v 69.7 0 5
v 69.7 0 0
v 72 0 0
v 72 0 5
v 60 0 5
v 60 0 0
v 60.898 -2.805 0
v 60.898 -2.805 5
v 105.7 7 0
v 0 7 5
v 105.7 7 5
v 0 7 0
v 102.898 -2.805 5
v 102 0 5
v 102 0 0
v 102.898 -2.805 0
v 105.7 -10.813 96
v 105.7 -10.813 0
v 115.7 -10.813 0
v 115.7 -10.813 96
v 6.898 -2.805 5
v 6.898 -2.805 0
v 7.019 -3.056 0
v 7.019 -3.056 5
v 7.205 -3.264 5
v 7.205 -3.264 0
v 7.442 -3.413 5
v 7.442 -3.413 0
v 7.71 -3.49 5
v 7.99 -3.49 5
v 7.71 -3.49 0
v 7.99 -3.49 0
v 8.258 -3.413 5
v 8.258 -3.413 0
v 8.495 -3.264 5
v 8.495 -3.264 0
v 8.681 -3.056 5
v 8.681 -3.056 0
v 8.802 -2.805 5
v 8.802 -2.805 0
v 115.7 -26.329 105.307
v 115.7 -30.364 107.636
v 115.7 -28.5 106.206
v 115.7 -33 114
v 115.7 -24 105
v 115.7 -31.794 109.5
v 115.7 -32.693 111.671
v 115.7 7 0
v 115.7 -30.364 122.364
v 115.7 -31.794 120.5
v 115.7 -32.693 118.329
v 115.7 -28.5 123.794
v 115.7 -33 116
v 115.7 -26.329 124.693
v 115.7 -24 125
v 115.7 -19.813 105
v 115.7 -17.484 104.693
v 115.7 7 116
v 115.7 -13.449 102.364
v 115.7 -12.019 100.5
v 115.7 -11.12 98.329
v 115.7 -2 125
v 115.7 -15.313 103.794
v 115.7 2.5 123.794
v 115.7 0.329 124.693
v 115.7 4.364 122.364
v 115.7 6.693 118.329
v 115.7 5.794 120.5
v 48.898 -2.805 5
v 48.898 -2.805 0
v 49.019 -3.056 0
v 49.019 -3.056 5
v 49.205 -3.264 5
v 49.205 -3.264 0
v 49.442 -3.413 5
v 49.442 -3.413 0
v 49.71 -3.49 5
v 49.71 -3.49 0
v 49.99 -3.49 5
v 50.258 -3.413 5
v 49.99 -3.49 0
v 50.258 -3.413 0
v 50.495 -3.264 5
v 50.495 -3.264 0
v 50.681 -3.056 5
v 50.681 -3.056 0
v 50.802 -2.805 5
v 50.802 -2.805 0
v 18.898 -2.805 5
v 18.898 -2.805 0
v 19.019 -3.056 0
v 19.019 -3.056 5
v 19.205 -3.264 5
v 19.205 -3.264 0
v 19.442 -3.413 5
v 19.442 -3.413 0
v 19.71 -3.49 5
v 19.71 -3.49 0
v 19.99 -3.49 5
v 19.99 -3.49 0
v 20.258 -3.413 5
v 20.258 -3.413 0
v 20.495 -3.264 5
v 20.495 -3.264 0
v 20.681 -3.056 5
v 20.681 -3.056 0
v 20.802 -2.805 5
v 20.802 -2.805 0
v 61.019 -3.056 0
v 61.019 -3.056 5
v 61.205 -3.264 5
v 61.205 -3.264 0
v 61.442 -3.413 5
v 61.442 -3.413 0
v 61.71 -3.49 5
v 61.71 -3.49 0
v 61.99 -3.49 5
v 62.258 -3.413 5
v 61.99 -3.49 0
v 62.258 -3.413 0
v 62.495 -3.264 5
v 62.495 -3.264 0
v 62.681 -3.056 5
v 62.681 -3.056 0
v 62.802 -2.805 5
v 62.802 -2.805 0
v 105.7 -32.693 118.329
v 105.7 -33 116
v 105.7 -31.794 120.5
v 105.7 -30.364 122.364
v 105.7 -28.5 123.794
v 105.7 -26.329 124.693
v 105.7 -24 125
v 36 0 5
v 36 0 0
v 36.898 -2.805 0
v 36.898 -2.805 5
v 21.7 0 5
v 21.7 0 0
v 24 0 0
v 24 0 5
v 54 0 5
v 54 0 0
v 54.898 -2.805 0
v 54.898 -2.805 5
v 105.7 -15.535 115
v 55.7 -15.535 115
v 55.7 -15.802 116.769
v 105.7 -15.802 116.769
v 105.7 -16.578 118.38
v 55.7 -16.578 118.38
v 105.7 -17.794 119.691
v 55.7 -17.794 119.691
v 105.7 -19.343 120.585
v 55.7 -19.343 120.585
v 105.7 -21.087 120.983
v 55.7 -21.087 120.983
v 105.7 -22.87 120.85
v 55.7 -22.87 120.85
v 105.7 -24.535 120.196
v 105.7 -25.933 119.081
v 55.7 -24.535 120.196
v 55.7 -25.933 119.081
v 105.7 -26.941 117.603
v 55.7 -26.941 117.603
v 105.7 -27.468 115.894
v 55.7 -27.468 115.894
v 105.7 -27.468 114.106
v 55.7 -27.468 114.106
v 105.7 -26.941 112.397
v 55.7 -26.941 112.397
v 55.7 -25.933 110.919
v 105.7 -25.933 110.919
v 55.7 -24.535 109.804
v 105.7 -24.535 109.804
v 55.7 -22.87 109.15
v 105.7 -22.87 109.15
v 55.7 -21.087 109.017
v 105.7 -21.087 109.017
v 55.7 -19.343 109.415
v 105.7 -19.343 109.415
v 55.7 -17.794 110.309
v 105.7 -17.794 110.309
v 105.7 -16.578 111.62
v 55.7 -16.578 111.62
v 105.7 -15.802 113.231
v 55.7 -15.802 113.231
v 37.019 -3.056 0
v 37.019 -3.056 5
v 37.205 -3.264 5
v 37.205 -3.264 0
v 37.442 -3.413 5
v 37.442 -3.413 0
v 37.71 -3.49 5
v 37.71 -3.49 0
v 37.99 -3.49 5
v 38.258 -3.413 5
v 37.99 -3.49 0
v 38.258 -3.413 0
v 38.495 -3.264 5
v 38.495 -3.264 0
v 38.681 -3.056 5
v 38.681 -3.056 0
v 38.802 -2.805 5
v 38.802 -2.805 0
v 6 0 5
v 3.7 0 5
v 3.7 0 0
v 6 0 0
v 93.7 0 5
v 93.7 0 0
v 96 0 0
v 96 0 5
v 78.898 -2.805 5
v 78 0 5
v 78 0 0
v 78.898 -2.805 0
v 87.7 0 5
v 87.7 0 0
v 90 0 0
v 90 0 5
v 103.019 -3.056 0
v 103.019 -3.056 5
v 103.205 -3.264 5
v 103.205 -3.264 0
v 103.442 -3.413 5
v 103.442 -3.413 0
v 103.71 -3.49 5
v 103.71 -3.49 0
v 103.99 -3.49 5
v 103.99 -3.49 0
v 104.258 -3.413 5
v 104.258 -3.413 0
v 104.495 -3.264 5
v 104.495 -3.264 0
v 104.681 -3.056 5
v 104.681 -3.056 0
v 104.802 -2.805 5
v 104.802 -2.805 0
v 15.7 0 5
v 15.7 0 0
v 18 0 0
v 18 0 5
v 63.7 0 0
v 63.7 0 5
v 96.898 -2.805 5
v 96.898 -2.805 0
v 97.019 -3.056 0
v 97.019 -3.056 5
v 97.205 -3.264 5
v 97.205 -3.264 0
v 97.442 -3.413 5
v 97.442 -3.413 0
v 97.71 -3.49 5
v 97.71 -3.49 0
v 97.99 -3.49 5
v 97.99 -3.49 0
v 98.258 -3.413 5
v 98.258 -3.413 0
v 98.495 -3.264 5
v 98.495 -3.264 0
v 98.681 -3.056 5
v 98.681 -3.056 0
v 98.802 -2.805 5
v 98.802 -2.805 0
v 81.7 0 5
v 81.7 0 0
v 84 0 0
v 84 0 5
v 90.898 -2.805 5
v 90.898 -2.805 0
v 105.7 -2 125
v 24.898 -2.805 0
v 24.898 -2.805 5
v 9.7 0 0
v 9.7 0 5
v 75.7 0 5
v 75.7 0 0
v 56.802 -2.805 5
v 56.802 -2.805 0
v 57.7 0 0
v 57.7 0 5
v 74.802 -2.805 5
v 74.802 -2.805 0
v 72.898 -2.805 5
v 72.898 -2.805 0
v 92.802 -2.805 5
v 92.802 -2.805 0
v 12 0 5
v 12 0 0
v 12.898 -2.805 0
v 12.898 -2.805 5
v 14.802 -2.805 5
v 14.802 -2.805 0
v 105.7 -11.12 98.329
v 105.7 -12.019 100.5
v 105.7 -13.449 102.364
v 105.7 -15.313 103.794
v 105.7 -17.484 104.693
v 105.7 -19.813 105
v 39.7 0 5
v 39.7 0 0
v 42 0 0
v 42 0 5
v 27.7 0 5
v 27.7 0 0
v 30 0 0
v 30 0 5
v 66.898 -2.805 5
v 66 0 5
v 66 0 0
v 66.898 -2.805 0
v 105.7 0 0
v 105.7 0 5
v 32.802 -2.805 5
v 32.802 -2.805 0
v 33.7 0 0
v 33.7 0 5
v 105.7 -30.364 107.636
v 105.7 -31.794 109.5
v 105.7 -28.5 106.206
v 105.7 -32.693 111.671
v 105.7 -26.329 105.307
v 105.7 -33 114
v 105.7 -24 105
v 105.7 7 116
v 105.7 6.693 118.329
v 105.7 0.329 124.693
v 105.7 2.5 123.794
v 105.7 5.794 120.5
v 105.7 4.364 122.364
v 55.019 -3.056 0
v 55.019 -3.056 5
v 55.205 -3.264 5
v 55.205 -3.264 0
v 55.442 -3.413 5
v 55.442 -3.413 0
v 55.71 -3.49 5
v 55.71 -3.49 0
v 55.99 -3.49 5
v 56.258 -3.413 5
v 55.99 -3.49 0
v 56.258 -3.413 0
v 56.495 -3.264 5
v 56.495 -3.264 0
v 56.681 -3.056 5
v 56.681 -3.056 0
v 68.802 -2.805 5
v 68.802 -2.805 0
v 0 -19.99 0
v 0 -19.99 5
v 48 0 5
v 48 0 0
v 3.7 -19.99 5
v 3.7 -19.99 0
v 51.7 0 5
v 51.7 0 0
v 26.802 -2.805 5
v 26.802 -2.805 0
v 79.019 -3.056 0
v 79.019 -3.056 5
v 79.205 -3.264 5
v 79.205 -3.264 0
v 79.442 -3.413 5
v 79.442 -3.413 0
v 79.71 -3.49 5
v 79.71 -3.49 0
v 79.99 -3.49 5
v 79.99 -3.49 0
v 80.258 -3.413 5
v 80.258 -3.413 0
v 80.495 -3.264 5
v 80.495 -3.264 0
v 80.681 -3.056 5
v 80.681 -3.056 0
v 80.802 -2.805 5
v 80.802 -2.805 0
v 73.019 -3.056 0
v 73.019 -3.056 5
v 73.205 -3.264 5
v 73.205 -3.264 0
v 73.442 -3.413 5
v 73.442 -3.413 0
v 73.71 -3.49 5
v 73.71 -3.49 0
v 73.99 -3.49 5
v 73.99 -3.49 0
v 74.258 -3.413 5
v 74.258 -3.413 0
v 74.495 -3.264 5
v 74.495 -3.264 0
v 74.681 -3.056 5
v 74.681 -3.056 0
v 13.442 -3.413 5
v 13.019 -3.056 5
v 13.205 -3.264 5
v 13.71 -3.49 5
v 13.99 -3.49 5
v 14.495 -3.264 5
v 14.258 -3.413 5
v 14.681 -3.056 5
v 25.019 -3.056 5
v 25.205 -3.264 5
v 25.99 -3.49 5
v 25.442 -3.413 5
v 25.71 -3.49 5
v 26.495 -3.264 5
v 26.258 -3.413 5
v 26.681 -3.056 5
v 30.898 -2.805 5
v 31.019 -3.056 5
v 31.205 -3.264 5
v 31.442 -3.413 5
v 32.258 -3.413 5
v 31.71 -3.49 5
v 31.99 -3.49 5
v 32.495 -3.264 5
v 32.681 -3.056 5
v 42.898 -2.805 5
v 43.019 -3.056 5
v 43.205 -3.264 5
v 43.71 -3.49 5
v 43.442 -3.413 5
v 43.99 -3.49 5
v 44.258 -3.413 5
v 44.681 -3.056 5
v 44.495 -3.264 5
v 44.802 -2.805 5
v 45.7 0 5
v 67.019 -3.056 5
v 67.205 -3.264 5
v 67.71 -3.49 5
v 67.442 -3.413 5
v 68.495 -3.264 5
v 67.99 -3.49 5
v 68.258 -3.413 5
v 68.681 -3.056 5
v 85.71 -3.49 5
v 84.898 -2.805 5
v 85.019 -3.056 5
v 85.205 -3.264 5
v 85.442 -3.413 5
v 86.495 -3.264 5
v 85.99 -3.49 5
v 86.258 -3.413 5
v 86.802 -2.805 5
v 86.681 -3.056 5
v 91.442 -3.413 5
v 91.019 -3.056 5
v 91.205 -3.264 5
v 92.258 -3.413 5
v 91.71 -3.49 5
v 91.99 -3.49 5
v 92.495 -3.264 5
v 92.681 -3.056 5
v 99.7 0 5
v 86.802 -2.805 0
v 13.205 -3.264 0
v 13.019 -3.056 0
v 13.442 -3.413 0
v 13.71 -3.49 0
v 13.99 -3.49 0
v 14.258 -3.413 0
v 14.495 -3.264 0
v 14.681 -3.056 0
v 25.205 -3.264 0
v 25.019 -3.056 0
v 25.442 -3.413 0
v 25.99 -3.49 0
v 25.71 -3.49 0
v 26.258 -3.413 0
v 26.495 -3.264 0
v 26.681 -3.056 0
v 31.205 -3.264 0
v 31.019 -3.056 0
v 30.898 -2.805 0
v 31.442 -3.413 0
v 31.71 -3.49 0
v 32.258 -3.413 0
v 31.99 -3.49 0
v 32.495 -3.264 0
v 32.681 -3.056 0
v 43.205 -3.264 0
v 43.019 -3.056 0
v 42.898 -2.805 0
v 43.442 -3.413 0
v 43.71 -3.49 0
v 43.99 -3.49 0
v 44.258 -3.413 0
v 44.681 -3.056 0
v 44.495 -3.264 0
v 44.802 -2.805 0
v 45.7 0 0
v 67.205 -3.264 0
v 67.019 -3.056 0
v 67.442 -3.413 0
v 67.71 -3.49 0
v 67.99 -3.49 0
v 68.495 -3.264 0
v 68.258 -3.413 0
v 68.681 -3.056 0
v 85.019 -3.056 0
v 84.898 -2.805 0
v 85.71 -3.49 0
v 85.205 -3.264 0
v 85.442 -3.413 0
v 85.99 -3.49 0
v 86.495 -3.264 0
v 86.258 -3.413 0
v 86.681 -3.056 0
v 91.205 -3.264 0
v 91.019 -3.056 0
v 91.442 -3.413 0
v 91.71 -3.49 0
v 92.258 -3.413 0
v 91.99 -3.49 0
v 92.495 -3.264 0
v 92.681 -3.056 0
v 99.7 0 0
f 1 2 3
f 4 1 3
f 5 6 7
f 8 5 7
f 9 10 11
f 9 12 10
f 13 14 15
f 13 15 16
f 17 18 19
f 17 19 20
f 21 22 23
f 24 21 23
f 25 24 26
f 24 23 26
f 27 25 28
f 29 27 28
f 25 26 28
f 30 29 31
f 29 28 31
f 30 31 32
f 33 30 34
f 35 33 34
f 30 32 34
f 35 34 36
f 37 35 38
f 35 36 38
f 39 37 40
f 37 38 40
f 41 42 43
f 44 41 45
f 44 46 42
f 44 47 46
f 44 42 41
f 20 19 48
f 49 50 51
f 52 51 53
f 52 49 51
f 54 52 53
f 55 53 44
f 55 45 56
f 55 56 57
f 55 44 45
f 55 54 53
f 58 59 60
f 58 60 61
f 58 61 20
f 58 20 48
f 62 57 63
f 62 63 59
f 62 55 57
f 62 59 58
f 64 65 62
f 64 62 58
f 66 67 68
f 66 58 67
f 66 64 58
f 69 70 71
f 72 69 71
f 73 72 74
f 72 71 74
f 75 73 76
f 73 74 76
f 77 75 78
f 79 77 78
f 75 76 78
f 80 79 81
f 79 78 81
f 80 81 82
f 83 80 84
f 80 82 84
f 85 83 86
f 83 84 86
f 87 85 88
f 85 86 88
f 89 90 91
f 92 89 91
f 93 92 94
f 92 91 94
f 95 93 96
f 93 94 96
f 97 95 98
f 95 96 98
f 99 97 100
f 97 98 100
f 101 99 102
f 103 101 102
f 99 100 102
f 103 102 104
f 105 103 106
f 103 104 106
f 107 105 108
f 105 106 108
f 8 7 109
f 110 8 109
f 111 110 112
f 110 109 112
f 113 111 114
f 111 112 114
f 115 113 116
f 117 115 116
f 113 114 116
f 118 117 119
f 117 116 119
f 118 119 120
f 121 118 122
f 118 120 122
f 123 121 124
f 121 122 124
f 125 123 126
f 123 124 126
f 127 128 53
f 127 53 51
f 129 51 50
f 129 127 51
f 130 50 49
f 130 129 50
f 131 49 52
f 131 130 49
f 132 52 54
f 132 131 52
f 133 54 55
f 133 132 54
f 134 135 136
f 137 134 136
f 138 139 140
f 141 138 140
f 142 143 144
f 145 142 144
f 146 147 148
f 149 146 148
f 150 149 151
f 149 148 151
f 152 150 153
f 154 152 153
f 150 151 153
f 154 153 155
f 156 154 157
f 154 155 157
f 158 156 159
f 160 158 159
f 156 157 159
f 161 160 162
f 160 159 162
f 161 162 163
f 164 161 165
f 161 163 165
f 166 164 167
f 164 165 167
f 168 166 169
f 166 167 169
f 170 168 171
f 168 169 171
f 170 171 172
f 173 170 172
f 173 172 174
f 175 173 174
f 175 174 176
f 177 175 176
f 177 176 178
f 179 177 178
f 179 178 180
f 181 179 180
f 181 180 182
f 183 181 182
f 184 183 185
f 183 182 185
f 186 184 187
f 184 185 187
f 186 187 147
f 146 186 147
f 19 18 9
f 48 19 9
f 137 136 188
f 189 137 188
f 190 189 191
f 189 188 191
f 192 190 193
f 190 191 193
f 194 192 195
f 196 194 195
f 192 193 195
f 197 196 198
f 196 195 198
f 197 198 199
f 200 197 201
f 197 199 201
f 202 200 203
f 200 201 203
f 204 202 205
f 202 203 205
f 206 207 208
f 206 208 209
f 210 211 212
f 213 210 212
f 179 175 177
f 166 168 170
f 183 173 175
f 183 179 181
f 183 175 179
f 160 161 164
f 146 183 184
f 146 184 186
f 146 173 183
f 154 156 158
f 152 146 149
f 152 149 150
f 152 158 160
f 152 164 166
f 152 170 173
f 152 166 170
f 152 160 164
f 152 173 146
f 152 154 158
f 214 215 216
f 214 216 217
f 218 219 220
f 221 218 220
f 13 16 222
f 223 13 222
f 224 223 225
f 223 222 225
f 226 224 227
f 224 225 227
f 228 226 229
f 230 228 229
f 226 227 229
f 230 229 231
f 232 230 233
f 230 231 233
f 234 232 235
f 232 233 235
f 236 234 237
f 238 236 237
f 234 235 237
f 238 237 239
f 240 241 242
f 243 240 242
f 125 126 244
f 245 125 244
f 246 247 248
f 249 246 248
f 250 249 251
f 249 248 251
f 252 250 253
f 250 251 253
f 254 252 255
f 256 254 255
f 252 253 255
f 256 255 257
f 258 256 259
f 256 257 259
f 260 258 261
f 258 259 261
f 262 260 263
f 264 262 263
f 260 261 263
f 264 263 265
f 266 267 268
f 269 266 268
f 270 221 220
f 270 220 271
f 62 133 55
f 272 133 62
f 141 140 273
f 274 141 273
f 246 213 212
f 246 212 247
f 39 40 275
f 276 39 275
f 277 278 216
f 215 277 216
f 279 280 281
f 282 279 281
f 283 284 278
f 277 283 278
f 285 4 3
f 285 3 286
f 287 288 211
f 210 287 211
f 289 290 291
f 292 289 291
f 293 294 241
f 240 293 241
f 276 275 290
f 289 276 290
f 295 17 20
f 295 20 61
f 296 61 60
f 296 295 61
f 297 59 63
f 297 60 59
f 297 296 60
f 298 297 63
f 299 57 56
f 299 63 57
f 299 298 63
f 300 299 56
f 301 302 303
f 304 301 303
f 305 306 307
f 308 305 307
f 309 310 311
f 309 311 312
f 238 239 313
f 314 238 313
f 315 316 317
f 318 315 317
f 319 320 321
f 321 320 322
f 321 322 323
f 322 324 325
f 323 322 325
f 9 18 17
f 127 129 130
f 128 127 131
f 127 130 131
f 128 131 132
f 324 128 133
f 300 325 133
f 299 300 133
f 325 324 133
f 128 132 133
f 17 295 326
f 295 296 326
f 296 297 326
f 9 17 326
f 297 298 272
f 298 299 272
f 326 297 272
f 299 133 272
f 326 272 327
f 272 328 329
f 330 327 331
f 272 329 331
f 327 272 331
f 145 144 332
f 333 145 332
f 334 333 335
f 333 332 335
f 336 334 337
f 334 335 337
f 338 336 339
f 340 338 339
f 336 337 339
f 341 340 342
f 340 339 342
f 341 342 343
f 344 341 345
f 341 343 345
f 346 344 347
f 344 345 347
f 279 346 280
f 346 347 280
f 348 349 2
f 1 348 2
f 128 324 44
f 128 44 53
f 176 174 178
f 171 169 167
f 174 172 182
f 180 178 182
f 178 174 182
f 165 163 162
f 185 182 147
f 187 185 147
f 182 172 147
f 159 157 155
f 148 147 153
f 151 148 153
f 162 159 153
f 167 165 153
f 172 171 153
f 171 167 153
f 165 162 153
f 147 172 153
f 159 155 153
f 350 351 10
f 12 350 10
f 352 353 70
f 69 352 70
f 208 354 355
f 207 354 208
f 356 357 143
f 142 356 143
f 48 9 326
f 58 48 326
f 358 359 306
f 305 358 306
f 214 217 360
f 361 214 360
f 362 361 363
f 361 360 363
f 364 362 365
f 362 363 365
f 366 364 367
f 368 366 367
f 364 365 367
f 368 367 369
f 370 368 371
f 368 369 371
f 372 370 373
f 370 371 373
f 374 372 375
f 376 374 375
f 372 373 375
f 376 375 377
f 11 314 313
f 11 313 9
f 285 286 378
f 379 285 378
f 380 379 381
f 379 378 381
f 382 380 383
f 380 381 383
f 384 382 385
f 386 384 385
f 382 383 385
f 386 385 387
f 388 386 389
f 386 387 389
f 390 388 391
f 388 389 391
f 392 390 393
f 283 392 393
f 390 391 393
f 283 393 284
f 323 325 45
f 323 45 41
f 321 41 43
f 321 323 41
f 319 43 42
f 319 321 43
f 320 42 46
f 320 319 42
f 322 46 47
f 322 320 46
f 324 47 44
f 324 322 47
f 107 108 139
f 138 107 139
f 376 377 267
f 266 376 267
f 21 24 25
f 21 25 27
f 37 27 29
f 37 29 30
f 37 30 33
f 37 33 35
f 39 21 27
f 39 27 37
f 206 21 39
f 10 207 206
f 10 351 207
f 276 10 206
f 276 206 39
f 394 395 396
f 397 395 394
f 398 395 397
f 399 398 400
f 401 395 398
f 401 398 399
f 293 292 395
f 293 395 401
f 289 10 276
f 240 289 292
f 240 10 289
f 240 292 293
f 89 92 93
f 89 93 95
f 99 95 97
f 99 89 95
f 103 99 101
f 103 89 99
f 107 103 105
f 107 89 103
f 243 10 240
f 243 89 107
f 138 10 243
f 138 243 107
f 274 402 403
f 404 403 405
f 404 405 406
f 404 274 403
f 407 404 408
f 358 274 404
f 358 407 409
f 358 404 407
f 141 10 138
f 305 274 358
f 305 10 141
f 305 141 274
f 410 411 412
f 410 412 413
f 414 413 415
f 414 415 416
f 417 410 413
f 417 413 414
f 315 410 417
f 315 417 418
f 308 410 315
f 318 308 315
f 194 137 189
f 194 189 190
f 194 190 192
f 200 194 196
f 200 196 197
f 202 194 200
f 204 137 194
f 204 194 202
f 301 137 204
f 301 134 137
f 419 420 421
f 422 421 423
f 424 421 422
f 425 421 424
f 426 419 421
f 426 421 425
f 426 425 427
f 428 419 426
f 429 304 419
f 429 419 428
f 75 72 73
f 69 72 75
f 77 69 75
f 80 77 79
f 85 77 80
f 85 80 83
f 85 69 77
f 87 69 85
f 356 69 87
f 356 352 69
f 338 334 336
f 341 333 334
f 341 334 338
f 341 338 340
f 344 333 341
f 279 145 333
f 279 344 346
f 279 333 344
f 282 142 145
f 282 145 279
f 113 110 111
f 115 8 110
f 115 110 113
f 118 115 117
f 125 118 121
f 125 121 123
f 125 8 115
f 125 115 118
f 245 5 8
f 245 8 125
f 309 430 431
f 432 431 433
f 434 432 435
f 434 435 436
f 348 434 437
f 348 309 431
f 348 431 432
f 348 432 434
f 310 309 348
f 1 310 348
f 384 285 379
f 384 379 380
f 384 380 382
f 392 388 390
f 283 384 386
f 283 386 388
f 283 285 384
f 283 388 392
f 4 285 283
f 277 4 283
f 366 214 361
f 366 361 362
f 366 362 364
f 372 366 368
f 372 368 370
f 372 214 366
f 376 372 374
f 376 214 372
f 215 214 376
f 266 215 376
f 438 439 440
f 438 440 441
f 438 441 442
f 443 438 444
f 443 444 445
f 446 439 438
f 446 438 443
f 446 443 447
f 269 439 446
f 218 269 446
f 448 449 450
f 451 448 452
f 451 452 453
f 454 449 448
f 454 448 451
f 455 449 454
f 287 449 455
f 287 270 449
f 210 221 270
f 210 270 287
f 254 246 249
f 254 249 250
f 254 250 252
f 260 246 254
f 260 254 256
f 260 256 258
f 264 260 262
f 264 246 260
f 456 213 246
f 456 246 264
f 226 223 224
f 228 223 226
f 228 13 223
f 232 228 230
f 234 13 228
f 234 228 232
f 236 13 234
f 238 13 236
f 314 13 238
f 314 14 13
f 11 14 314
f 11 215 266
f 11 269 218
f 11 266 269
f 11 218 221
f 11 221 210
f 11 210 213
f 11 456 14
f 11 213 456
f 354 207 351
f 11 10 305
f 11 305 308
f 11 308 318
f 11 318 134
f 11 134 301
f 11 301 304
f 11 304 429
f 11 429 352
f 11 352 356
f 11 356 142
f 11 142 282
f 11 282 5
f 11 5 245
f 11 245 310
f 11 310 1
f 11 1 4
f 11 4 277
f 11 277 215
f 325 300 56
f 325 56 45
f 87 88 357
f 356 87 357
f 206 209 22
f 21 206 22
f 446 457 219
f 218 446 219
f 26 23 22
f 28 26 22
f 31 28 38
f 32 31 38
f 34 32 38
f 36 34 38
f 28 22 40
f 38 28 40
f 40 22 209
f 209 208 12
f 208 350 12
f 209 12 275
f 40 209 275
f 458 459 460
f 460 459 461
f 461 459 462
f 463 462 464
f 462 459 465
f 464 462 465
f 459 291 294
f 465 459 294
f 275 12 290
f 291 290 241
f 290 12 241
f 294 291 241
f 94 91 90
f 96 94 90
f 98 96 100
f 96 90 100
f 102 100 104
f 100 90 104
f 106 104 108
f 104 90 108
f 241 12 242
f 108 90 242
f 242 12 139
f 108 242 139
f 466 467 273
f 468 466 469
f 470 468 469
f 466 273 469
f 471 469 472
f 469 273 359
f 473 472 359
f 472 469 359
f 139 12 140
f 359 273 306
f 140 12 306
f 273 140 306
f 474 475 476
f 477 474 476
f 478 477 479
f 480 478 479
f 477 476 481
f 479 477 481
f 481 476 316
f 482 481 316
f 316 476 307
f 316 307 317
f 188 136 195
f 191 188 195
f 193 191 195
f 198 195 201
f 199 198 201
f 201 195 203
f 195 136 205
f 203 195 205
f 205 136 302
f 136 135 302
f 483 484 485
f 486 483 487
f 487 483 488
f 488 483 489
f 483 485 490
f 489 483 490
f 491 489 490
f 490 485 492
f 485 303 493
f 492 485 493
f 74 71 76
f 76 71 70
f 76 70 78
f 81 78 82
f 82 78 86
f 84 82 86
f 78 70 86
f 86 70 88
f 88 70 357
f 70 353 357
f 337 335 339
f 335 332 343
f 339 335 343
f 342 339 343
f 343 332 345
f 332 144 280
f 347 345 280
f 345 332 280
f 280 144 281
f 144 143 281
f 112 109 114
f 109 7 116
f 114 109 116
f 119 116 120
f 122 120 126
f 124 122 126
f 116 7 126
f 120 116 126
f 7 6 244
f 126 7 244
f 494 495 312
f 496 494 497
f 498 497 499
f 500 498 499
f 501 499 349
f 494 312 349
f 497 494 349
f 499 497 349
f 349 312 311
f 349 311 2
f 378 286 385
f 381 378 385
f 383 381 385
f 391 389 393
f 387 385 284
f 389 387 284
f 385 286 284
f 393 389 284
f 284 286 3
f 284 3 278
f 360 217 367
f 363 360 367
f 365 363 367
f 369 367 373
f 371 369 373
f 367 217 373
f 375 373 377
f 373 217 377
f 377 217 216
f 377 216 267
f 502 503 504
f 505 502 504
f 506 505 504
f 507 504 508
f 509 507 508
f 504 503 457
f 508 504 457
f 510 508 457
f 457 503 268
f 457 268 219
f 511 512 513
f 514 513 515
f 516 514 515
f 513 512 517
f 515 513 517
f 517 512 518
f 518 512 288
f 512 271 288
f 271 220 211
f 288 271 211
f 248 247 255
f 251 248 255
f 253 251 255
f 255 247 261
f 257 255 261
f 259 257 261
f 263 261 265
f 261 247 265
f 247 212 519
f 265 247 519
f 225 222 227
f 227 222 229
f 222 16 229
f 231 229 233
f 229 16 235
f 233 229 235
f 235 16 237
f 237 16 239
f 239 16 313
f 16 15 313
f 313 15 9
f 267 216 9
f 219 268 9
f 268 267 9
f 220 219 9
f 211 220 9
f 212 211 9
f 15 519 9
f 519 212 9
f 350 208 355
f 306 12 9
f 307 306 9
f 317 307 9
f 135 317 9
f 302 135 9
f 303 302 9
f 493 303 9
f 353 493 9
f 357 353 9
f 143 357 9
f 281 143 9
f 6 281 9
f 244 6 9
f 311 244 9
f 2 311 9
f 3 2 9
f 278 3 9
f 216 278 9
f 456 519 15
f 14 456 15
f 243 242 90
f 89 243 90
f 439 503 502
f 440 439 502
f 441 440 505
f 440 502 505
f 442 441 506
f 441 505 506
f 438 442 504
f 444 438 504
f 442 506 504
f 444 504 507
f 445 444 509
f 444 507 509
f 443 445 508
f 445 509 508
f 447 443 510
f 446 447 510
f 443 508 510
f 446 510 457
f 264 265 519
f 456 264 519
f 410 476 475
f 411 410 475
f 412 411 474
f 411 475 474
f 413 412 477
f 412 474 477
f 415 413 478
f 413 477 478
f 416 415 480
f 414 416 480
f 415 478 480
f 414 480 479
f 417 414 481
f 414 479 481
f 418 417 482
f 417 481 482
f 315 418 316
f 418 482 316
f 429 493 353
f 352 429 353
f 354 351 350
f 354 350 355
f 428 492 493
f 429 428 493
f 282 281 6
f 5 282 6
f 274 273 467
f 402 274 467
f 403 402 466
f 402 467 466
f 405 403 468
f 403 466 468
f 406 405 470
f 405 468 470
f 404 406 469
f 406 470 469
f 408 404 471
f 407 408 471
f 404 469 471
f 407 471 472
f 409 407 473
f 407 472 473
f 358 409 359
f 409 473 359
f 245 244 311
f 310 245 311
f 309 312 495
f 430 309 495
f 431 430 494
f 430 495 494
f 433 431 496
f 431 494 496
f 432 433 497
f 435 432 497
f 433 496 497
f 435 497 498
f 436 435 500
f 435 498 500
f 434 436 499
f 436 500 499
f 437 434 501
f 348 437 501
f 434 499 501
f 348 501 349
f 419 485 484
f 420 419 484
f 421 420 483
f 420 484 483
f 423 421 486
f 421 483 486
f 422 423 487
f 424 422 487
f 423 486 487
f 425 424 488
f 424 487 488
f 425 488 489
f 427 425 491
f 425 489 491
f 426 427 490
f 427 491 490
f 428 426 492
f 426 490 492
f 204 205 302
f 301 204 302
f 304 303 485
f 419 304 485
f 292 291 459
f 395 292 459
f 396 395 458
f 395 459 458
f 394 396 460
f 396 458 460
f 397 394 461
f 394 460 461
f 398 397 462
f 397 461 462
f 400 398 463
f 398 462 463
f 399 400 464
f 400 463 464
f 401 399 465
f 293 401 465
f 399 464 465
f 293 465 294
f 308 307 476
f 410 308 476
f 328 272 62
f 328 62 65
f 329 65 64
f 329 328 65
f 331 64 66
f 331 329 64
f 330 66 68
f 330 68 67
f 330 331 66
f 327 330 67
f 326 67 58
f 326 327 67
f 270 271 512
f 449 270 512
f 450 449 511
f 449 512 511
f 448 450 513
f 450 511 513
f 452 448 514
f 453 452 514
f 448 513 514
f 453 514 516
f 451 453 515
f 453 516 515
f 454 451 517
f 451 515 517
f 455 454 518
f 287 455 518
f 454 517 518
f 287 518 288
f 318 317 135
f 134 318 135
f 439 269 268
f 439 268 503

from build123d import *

# Parameters (mm, degrees)
DODANIE_WYCI_GNI_CIE1_DEPTH = 5
SZKIC3_W                    = 10
SZKIC3_H                    = 40
DODANIE_WYCI_GNI_CIE2_DEPTH = 120
SZKIC4_R                    = 6
DODANIE_WYCI_GNI_CIE3_DEPTH = 50
PODZIEL1_START              = 105.7
PODZIEL1_OUTLINE_W          = 40
PODZIEL1_OUTLINE_H          = 125
PODZIEL1_DEPTH              = 10
PODZIEL1_START_2            = 55.7
PODZIEL1_2_OUTLINE_R        = 6
PODZIEL1_2_DEPTH            = 50
PODZIEL1_3_OUTLINE_W        = 40
PODZIEL1_3_OUTLINE_H        = 125
PODZIEL1_3_DEPTH            = 10
PODZIEL1_4_OUTLINE_R        = 6
PODZIEL1_4_DEPTH            = 50
WYTNIJ_WYCI_GNI_CIE1_DEPTH  = 167.992484861
SZKIC7_W                    = 3.7
SZKIC7_H                    = 26.99
DODANIE_WYCI_GNI_CIE4_DEPTH = 5


# Read off the part's stored shape, not the designer's step: Podziel1
with BuildPart() as part:
    # Szkic2 → Dodanie-wyciągnięcie1 (new body)
    with BuildSketch(Plane.XY):
        with BuildLine():
            Line((9.7, 0), (12, 0))
            Line((12, 0), (12.897580547, -2.804790395))
            ThreePointArc((12.897580547, -2.804790395), (13.85, -3.5), (14.802419453, -2.804790395))
            Line((14.802419453, -2.804790395), (15.7, 0))
            Line((15.7, 0), (18, 0))
            Line((18, 0), (18.897580547, -2.804790395))
            ThreePointArc((18.897580547, -2.804790395), (19.85, -3.5), (20.802419453, -2.804790395))
            Line((20.802419453, -2.804790395), (21.7, 0))
            Line((21.7, 0), (24, 0))
            Line((24, 0), (24.897580547, -2.804790395))
            ThreePointArc((24.897580547, -2.804790395), (25.85, -3.5), (26.802419453, -2.804790395))
            Line((26.802419453, -2.804790395), (27.7, 0))
            Line((27.7, 0), (30, 0))
            Line((30, 0), (30.897580547, -2.804790395))
            ThreePointArc((30.897580547, -2.804790395), (31.85, -3.5), (32.802419453, -2.804790395))
            Line((32.802419453, -2.804790395), (33.7, 0))
            Line((33.7, 0), (36, 0))
            Line((36, 0), (36.897580547, -2.804790395))
            ThreePointArc((36.897580547, -2.804790395), (37.85, -3.5), (38.802419453, -2.804790395))
            Line((38.802419453, -2.804790395), (39.7, 0))
            Line((39.7, 0), (42, 0))
            Line((42, 0), (42.897580547, -2.804790395))
            ThreePointArc((42.897580547, -2.804790395), (43.85, -3.5), (44.802419453, -2.804790395))
            Line((44.802419453, -2.804790395), (45.7, 0))
            Line((45.7, 0), (48, 0))
            Line((48, 0), (48.897580547, -2.804790395))
            ThreePointArc((48.897580547, -2.804790395), (49.85, -3.5), (50.802419453, -2.804790395))
            Line((50.802419453, -2.804790395), (51.7, 0))
            Line((51.7, 0), (54, 0))
            Line((54, 0), (54.897580547, -2.804790395))
            ThreePointArc((54.897580547, -2.804790395), (55.85, -3.5), (56.802419453, -2.804790395))
            Line((56.802419453, -2.804790395), (57.7, 0))
            Line((57.7, 0), (60, 0))
            Line((60, 0), (60.897580547, -2.804790395))
            ThreePointArc((60.897580547, -2.804790395), (61.85, -3.5), (62.802419453, -2.804790395))
            Line((62.802419453, -2.804790395), (63.7, 0))
            Line((63.7, 0), (66, 0))
            Line((66, 0), (66.897580547, -2.804790395))
            ThreePointArc((66.897580547, -2.804790395), (67.85, -3.5), (68.802419453, -2.804790395))
            Line((68.802419453, -2.804790395), (69.7, 0))
            Line((69.7, 0), (72, 0))
            Line((72, 0), (72.897580547, -2.804790395))
            ThreePointArc((72.897580547, -2.804790395), (73.85, -3.5), (74.802419453, -2.804790395))
            Line((74.802419453, -2.804790395), (75.7, 0))
            Line((75.7, 0), (78, 0))
            Line((78, 0), (78.897580547, -2.804790395))
            ThreePointArc((78.897580547, -2.804790395), (79.85, -3.5), (80.802419453, -2.804790395))
            Line((80.802419453, -2.804790395), (81.7, 0))
            Line((81.7, 0), (84, 0))
            Line((84, 0), (84.897580547, -2.804790395))
            ThreePointArc((84.897580547, -2.804790395), (85.85, -3.5), (86.802419453, -2.804790395))
            Line((86.802419453, -2.804790395), (87.7, 0))
            Line((87.7, 0), (90, 0))
            Line((90, 0), (90.897580547, -2.804790395))
            ThreePointArc((90.897580547, -2.804790395), (91.85, -3.5), (92.802419453, -2.804790395))
            Line((92.802419453, -2.804790395), (93.7, 0))
            Line((93.7, 0), (96, 0))
            Line((96, 0), (96.897580547, -2.804790395))
            ThreePointArc((96.897580547, -2.804790395), (97.85, -3.5), (98.802419453, -2.804790395))
            Line((98.802419453, -2.804790395), (99.7, 0))
            Line((99.7, 0), (102, 0))
            Line((102, 0), (102.897580547, -2.804790395))
            ThreePointArc((102.897580547, -2.804790395), (103.85, -3.5), (104.802419453, -2.804790395))
            Line((104.802419453, -2.804790395), (105.7, 0))
            Line((105.7, 0), (105.7, -33))
            Line((105.7, -33), (115.7, -33))
            Line((115.7, -33), (115.7, 7))
            Line((115.7, 7), (105.7, 7))
            Line((105.7, 7), (0, 7))
            Line((0, 7), (0, 0))
            Line((0, 0), (0.897580547, -2.804790395))
            ThreePointArc((0.897580547, -2.804790395), (1.85, -3.5), (2.802419453, -2.804790395))
            Line((2.802419453, -2.804790395), (3.7, 0))
            Line((3.7, 0), (6, 0))
            Line((6, 0), (6.897580547, -2.804790395))
            ThreePointArc((6.897580547, -2.804790395), (7.85, -3.5), (8.802419453, -2.804790395))
            Line((8.802419453, -2.804790395), (9.7, 0))
        make_face()
    extrude(amount=DODANIE_WYCI_GNI_CIE1_DEPTH)

    # Szkic3 → Dodanie-wyciągnięcie2 (add)
    with BuildSketch(Plane.XY.offset(5)):
        with Locations((110.7, -13)):
            Rectangle(SZKIC3_W, SZKIC3_H)
    extrude(amount=DODANIE_WYCI_GNI_CIE2_DEPTH)

    # Szkic4 → Dodanie-wyciągnięcie3 (add)
    with BuildSketch(Plane.ZY.offset(-105.7)):
        with Locations(Location((115, -21.535, 0), (0, 0, 90))):
            Circle(SZKIC4_R)
    extrude(amount=DODANIE_WYCI_GNI_CIE3_DEPTH)

    # Podziel1 outline → Podziel1 (cut)
    with BuildSketch(Plane.YZ.offset(PODZIEL1_START)):
        with Locations((-13, 62.5)):
            Rectangle(PODZIEL1_OUTLINE_W, PODZIEL1_OUTLINE_H)
    extrude(amount=PODZIEL1_DEPTH, mode=Mode.SUBTRACT)

    # Podziel1 2 outline → Podziel1 2 (cut)
    with BuildSketch(Plane.YZ.offset(PODZIEL1_START_2)):
        with Locations((-21.535, 115)):
            Circle(PODZIEL1_2_OUTLINE_R)
    extrude(amount=PODZIEL1_2_DEPTH, mode=Mode.SUBTRACT)

    # Szkic7 → Dodanie-wyciągnięcie4 (add)
    with BuildSketch(Plane.XY.offset(5)):
        with Locations((1.85, -6.495)):
            Rectangle(SZKIC7_W, SZKIC7_H)
    extrude(amount=-DODANIE_WYCI_GNI_CIE4_DEPTH)


with BuildPart() as body_2:
    # Podziel1 3 outline → Podziel1 3 (new body)
    with BuildSketch(Plane.YZ.offset(PODZIEL1_START)):
        with Locations((-13, 62.5)):
            Rectangle(PODZIEL1_3_OUTLINE_W, PODZIEL1_3_OUTLINE_H)
    extrude(amount=PODZIEL1_3_DEPTH)

    # Szkic6 → Wytnij-wyciągnięcie1 (cut, through all)
    with BuildSketch(Plane.ZY.offset(-105.7)):
        with BuildLine():
            Line((0, -10.813339386), (96, -10.813339386))
            ThreePointArc((96, -10.813339386), (102.363961031, -13.449378356), (105, -19.813339386))
            Line((105, -19.813339386), (105, -24))
            ThreePointArc((105, -24), (107.636038969, -30.363961031), (114, -33))
            Line((114, -33), (116, -33))
            ThreePointArc((116, -33), (122.363961031, -30.363961031), (125, -24))
            Line((125, -24), (125, -2))
            ThreePointArc((125, -2), (122.363961031, 4.363961031), (116, 7))
            Line((116, 7), (106.876347747, 7))
            Line((106.876347747, 7), (106.876347747, 17.227367306))
            Line((106.876347747, 17.227367306), (133.63078349, 17.227367306))
            Line((133.63078349, 17.227367306), (133.63078349, -45.542655015))
            Line((133.63078349, -45.542655015), (0, -45.542655015))
            Line((0, -45.542655015), (0, -10.813339386))
        make_face()
    extrude(amount=-WYTNIJ_WYCI_GNI_CIE1_DEPTH, mode=Mode.SUBTRACT)


with BuildPart() as body_3:
    # Podziel1 4 outline → Podziel1 4 (new body)
    with BuildSketch(Plane.YZ.offset(PODZIEL1_START_2)):
        with Locations((-21.535, 115)):
            Circle(PODZIEL1_4_OUTLINE_R)
    extrude(amount=PODZIEL1_4_DEPTH)


solid = Compound([part.part, body_2.part, body_3.part])
